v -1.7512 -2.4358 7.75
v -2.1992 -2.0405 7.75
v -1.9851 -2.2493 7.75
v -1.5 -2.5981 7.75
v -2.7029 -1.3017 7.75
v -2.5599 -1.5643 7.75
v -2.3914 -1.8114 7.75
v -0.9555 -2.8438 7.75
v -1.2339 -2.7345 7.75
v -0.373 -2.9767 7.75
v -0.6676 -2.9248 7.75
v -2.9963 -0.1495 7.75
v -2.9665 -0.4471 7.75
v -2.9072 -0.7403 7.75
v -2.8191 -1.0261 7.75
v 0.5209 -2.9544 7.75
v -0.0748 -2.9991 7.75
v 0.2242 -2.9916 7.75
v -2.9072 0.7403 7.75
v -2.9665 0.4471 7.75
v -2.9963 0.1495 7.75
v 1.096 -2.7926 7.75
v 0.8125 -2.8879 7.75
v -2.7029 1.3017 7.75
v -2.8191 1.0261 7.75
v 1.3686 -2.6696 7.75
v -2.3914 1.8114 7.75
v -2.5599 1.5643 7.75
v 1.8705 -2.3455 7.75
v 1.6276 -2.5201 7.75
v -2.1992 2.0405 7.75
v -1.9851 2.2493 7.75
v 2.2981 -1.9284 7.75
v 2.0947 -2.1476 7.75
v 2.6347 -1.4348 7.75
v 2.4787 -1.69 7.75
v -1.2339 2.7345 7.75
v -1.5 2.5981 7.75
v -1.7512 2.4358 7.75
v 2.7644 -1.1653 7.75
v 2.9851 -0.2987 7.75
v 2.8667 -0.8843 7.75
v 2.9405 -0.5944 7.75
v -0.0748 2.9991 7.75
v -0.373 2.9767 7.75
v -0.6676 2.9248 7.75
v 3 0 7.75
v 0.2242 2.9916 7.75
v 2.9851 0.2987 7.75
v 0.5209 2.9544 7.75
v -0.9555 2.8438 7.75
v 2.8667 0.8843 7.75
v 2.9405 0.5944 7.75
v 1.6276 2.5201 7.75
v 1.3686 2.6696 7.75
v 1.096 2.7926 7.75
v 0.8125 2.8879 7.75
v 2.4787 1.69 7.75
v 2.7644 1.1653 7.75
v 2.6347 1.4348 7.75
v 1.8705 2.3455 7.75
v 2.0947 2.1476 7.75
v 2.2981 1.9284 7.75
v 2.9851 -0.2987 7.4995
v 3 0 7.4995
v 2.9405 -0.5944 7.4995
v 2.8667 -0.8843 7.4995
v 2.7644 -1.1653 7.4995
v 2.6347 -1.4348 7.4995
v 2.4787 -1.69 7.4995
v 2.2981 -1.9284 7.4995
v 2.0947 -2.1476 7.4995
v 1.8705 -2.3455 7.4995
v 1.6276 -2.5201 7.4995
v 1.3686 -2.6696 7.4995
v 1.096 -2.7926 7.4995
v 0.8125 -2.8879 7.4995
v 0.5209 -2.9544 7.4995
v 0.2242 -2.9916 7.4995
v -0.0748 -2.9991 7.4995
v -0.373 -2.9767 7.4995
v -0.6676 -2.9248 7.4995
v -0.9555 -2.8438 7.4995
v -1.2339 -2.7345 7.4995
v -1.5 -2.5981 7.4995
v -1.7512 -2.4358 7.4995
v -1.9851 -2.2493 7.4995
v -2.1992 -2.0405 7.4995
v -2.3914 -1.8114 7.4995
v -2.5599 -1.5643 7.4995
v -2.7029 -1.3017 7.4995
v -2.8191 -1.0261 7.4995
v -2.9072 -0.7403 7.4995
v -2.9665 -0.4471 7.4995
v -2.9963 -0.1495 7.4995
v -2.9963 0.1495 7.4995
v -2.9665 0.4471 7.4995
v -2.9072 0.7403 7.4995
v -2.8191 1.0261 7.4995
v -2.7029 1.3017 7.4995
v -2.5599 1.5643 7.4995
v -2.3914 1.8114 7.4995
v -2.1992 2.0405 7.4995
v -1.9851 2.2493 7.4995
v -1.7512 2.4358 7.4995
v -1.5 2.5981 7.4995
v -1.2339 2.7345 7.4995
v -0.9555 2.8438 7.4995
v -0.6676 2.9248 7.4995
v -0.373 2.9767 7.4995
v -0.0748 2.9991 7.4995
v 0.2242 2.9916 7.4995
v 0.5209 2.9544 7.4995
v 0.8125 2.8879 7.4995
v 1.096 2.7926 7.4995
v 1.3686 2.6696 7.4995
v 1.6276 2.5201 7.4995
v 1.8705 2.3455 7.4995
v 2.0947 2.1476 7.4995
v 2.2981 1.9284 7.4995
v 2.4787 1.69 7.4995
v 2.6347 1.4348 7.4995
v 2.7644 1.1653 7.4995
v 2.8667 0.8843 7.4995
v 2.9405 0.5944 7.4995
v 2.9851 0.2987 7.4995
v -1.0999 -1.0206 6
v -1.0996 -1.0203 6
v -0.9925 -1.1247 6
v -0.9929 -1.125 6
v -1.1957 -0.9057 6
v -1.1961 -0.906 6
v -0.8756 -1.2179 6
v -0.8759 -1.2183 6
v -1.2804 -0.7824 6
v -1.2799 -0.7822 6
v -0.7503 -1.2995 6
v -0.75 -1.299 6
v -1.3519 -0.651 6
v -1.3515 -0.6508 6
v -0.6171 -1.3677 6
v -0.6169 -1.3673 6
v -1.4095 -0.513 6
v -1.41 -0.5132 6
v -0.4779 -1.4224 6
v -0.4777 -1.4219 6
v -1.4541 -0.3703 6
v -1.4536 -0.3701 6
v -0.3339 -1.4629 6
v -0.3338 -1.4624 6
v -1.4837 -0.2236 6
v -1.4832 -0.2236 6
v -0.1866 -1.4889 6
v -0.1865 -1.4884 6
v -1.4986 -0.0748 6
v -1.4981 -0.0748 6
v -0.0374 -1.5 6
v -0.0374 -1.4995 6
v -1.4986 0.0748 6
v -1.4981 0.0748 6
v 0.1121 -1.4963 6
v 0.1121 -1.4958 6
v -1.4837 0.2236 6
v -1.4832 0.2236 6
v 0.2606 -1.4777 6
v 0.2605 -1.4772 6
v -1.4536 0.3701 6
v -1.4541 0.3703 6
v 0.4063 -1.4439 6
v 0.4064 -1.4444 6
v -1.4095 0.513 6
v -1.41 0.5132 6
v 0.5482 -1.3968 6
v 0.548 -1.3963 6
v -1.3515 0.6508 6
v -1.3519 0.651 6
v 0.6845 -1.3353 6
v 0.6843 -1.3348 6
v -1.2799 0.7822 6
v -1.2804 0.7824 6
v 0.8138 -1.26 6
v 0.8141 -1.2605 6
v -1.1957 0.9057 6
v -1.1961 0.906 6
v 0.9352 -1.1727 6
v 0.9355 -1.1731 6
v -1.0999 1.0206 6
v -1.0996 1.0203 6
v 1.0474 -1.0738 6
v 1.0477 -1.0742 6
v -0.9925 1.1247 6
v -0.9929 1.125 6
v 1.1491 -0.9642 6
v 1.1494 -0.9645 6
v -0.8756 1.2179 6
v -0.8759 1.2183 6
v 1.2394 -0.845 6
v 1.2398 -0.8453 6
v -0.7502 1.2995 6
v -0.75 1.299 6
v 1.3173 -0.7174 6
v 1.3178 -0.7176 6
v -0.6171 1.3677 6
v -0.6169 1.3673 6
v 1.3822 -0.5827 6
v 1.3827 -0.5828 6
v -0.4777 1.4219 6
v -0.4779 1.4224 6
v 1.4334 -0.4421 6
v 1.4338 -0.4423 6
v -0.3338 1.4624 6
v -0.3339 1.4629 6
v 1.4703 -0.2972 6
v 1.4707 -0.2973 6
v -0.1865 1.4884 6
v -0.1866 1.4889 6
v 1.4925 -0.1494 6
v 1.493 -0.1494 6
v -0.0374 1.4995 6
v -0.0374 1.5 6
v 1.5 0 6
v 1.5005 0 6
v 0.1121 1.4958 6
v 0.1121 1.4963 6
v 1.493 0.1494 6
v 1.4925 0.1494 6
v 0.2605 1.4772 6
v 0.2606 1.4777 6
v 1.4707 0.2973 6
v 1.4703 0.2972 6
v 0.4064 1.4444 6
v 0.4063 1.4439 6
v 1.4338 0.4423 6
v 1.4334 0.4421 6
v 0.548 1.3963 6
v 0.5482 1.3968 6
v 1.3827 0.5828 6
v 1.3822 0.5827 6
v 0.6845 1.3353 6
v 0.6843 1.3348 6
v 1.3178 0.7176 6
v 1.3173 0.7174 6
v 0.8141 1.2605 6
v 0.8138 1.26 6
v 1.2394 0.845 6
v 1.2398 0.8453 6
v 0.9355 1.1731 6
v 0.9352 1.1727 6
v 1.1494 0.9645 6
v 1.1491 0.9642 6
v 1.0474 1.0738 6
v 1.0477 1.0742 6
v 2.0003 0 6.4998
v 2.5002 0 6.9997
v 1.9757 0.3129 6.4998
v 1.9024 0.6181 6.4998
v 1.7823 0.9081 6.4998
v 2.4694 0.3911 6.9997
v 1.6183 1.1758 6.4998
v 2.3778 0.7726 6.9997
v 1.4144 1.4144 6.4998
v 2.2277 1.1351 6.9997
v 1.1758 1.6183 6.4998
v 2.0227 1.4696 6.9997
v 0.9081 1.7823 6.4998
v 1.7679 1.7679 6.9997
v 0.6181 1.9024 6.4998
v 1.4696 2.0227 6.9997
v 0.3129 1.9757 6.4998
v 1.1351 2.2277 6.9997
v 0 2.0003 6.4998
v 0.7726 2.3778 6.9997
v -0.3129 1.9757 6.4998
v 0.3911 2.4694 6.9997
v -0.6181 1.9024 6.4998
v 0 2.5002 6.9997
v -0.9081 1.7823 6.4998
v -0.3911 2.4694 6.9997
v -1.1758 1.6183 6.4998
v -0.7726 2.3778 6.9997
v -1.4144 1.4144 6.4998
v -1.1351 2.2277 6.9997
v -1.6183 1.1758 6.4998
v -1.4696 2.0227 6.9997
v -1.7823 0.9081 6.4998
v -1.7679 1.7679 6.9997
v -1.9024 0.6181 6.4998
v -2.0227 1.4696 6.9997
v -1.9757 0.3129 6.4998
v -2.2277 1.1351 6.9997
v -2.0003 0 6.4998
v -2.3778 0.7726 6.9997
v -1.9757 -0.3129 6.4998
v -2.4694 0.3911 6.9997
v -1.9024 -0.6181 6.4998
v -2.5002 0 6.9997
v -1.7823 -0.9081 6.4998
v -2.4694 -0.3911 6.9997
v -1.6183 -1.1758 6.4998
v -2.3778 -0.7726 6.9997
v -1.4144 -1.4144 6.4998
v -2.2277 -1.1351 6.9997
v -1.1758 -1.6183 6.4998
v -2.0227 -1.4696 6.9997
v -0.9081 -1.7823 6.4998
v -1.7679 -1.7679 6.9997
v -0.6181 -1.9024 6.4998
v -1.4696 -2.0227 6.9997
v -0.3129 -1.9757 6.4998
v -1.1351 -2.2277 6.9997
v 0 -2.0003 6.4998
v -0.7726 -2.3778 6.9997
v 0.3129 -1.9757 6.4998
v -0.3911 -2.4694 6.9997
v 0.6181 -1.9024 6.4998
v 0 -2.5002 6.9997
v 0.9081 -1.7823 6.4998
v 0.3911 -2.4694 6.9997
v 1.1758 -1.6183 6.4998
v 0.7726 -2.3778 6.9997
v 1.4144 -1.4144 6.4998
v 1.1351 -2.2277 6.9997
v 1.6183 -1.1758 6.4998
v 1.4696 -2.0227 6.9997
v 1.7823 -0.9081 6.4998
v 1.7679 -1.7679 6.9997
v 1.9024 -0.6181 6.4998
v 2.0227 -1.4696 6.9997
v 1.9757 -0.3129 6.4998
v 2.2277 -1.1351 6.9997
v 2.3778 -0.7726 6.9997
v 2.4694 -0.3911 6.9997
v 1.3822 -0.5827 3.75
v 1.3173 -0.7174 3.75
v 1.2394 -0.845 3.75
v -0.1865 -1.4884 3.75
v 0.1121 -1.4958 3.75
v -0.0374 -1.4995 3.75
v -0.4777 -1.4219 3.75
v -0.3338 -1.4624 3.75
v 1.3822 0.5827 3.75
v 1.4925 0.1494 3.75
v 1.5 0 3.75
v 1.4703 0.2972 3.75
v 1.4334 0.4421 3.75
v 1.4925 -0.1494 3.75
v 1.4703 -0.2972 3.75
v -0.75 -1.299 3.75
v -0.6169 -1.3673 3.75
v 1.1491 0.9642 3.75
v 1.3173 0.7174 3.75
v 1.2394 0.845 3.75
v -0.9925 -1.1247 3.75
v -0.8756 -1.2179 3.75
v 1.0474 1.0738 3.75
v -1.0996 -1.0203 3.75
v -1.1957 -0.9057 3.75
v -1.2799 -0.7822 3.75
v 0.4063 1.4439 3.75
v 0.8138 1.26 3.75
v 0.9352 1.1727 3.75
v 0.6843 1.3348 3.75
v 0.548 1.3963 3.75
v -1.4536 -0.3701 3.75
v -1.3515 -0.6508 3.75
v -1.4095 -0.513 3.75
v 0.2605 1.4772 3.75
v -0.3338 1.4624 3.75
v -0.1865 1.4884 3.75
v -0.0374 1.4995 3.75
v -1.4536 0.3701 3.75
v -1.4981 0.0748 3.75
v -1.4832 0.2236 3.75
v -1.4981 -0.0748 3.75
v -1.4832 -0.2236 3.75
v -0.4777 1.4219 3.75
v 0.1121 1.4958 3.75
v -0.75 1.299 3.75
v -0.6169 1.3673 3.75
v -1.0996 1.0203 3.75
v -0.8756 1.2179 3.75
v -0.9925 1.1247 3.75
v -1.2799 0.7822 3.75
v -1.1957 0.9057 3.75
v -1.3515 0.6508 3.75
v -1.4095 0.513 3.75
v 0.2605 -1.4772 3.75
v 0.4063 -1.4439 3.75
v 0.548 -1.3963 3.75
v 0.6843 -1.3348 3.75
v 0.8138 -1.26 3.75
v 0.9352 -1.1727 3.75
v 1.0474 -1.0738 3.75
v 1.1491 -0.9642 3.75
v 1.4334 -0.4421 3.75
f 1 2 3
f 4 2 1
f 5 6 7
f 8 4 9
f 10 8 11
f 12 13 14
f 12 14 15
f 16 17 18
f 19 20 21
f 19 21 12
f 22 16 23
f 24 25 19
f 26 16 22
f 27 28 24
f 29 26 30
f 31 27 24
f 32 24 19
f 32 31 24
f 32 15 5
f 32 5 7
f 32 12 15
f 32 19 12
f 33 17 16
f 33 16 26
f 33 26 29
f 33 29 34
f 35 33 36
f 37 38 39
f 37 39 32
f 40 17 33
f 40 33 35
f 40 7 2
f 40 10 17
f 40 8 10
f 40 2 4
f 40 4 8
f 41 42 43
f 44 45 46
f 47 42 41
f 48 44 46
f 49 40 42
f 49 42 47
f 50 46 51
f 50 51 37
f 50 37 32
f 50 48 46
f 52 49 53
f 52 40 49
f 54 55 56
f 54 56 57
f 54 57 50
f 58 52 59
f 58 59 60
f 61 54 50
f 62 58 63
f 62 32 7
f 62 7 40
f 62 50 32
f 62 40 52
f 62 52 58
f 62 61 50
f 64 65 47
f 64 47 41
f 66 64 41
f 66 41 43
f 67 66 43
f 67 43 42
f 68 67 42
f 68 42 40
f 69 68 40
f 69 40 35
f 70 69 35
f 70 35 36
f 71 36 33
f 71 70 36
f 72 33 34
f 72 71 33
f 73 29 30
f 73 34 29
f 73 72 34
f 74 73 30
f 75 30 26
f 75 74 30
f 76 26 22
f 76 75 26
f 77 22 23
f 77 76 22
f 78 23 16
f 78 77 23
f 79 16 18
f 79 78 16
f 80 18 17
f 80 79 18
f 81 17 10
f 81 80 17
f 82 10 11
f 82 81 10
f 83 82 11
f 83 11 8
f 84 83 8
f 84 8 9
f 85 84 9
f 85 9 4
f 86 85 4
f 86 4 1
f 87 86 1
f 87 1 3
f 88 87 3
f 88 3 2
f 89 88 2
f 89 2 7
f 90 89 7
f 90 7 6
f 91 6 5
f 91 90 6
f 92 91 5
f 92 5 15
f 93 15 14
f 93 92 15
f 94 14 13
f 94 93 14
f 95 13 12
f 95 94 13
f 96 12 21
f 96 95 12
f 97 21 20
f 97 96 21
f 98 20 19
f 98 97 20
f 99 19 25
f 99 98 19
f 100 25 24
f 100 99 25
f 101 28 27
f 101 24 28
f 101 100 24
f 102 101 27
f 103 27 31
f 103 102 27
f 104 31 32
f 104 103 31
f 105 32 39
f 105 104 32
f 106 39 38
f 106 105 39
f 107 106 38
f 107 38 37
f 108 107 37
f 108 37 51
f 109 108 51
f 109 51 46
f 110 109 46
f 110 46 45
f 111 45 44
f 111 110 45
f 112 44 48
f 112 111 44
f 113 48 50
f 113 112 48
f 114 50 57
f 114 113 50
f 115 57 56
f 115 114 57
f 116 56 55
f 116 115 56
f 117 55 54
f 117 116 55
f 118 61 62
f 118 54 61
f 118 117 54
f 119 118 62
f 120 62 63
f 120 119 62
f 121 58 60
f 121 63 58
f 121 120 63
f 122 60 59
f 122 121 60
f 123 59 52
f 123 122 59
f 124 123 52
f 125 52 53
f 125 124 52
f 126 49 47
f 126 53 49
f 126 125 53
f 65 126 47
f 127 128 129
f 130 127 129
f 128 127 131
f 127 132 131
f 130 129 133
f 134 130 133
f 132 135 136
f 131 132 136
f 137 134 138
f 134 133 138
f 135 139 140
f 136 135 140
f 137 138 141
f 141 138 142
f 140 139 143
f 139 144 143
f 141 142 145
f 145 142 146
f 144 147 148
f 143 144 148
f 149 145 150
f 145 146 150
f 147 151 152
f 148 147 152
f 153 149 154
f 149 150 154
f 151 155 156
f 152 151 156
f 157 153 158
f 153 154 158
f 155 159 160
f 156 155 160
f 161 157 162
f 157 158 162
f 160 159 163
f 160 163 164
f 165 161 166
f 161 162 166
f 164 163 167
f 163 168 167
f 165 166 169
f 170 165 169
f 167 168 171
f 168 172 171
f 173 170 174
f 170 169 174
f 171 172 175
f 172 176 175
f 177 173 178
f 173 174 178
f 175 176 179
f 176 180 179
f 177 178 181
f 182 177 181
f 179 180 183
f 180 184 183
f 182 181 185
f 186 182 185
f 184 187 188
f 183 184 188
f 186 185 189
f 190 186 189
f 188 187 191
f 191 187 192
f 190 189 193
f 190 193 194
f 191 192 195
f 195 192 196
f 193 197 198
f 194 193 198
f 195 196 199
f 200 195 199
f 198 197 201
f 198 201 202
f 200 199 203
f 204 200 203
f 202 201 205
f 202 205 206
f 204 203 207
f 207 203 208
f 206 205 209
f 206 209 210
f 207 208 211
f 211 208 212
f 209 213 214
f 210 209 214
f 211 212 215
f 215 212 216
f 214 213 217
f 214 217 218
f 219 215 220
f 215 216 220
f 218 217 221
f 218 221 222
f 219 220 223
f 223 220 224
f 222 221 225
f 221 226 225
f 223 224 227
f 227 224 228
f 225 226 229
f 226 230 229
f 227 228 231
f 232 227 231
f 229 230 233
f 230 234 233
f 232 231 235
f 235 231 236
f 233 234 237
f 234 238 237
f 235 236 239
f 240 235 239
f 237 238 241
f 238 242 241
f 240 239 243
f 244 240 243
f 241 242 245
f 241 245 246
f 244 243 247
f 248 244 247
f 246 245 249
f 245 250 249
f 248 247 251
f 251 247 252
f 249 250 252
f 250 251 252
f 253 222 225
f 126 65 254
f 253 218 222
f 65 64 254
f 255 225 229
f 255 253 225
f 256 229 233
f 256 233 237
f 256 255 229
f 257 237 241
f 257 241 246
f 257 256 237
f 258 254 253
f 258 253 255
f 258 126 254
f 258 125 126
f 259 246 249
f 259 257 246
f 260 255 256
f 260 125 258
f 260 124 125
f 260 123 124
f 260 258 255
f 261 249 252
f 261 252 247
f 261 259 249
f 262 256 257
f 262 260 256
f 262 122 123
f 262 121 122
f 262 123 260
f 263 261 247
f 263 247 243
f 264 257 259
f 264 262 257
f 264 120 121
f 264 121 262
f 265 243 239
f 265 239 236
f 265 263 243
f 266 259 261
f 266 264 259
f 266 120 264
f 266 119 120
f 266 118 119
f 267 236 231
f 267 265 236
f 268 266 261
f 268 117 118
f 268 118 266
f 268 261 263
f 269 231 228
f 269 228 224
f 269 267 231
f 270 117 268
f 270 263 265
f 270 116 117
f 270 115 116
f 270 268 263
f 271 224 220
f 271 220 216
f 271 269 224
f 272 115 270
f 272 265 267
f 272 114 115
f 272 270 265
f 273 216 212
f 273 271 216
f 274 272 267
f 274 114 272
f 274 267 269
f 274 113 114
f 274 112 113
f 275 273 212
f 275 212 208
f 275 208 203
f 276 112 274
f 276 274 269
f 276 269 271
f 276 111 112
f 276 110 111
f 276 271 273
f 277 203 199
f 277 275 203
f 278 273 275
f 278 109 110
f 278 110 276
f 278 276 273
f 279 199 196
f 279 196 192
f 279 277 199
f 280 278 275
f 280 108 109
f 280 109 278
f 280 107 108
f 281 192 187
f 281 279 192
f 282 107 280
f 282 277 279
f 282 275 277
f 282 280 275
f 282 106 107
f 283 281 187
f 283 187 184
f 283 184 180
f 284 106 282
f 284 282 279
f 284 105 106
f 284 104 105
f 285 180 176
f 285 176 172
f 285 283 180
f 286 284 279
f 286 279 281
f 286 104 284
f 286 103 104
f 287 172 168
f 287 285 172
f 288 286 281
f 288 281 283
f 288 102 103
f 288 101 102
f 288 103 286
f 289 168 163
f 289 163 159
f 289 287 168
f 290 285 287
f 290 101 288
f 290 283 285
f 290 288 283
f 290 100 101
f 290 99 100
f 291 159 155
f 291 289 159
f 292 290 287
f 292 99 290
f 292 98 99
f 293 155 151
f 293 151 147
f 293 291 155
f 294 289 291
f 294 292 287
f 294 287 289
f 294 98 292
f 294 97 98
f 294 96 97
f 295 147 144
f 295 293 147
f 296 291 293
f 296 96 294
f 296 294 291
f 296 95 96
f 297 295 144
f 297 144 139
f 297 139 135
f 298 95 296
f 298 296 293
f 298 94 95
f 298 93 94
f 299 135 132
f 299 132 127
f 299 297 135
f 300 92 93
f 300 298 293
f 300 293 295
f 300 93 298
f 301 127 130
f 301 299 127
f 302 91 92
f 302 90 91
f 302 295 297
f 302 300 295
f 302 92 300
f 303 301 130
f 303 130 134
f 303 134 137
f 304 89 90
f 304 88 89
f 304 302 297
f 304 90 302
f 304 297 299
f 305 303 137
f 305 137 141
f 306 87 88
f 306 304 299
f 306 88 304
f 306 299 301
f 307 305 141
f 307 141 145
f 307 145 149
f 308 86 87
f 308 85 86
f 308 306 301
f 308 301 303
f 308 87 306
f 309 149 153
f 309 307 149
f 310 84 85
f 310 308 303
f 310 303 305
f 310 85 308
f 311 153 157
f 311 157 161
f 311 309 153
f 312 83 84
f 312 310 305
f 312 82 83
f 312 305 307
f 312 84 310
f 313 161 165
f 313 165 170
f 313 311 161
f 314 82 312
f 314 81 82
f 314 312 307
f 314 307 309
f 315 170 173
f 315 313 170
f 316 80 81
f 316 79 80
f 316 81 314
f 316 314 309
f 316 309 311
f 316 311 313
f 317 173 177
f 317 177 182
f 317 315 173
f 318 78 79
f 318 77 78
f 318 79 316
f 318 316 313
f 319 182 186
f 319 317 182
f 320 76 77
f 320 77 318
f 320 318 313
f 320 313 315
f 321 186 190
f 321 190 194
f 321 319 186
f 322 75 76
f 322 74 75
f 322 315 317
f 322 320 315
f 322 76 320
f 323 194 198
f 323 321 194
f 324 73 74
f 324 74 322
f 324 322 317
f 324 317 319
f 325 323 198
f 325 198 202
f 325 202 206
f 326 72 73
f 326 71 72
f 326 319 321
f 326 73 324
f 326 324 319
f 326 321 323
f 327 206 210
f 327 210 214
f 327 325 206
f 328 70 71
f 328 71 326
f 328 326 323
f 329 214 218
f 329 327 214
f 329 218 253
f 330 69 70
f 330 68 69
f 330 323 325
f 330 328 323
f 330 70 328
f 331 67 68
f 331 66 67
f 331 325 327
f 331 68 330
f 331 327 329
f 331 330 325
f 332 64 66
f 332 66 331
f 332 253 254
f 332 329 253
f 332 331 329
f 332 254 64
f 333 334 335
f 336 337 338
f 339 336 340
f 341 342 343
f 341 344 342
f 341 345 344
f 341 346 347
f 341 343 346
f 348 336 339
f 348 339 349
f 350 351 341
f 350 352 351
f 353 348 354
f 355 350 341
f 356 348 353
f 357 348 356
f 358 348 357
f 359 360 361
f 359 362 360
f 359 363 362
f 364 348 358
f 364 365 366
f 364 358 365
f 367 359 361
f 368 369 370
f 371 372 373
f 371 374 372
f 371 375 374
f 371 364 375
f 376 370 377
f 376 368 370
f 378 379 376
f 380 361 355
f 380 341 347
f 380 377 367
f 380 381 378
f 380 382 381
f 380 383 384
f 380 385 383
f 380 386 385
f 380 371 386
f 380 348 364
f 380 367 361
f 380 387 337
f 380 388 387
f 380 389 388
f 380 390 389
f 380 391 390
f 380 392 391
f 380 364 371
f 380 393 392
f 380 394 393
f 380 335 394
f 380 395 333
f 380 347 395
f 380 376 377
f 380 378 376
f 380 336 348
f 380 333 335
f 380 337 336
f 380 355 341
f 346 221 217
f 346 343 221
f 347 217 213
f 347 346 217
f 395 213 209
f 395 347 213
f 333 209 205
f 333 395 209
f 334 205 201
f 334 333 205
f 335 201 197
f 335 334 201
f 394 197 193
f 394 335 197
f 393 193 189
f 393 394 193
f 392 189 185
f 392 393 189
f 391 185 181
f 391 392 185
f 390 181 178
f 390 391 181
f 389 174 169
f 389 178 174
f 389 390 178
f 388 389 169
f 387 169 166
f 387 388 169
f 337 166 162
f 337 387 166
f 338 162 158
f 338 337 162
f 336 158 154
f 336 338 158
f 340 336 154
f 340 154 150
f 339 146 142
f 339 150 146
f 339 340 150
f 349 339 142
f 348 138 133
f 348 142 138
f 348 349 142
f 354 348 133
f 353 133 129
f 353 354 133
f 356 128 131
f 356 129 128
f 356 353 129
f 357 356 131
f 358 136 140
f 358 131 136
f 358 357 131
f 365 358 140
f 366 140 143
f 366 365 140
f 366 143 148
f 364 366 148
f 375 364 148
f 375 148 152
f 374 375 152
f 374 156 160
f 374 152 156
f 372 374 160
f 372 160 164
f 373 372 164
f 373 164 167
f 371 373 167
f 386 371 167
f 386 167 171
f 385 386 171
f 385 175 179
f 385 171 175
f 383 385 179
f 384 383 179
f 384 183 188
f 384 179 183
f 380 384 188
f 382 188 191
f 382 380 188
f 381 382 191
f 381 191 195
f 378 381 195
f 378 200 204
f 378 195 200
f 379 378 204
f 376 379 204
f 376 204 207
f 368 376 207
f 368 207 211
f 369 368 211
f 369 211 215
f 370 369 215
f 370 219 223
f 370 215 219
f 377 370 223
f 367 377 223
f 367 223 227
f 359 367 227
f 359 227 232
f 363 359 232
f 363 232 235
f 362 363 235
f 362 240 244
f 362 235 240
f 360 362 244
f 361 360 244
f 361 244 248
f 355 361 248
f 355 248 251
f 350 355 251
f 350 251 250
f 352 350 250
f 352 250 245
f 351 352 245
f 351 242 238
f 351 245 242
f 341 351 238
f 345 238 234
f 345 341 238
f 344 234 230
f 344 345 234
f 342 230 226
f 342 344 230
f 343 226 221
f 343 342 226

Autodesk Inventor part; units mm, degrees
ref_plane "YZ Plane" through (0, 0, 0) normal (1, 0, 0) x (0, 1, 0)
ref_plane "XZ Plane" through (0, 0, 0) normal (0, 1, 0) x (-1, 0, 0)
ref_plane "XY Plane" through (0, 0, 0) normal (0, 0, 1) x (1, 0, 0)
sketch "スケッチ1" plane through (0, 0, 0) normal (0, 0, 1) x (1, 0, 0)
  circle A0 centre (0, 0) radius 1.5
  dimension "d0" = 3
extrude "押し出し1" add sketch "スケッチ1" along normal blind 6
sketch "スケッチ2" plane through (0, 0, 6) normal (0, 0, 1) x (1, 0, 0)
  circle A0 centre (0, 0) radius 1.5 projected
  circle A1 centre (0, 0) radius 3
  dimension "d3" = 6
extrude "押し出し2" add sketch "スケッチ2" along normal blind 1.75 contours A0 | A1
thread "ねじ1" size "M3x0.5" class "6g" standard "ANSI Metric M Profile" full length
chamfer "面取り1" distance 1.5 angle 45 1 edges at (-3, 0, 6)
sketch "スケッチ4" plane through (0, 0, 0) normal (0, 0, -1) x (-1, 0, 0)
  circle A0 centre (0, 0) radius 1.5 projected
extrude "押し出し4" cut sketch "スケッチ4" against normal blind 2
sketch "スケッチ5" plane through (0, 0, 2) normal (0, 0, -1) x (-1, 0, 0)
  circle A0 centre (0, 0) radius 1.5 projected
extrude "押し出し5" cut sketch "スケッチ5" against normal blind 1.75
properties part number "SB　4mm皿ネジ(高い)" material "Steel, Mild"
